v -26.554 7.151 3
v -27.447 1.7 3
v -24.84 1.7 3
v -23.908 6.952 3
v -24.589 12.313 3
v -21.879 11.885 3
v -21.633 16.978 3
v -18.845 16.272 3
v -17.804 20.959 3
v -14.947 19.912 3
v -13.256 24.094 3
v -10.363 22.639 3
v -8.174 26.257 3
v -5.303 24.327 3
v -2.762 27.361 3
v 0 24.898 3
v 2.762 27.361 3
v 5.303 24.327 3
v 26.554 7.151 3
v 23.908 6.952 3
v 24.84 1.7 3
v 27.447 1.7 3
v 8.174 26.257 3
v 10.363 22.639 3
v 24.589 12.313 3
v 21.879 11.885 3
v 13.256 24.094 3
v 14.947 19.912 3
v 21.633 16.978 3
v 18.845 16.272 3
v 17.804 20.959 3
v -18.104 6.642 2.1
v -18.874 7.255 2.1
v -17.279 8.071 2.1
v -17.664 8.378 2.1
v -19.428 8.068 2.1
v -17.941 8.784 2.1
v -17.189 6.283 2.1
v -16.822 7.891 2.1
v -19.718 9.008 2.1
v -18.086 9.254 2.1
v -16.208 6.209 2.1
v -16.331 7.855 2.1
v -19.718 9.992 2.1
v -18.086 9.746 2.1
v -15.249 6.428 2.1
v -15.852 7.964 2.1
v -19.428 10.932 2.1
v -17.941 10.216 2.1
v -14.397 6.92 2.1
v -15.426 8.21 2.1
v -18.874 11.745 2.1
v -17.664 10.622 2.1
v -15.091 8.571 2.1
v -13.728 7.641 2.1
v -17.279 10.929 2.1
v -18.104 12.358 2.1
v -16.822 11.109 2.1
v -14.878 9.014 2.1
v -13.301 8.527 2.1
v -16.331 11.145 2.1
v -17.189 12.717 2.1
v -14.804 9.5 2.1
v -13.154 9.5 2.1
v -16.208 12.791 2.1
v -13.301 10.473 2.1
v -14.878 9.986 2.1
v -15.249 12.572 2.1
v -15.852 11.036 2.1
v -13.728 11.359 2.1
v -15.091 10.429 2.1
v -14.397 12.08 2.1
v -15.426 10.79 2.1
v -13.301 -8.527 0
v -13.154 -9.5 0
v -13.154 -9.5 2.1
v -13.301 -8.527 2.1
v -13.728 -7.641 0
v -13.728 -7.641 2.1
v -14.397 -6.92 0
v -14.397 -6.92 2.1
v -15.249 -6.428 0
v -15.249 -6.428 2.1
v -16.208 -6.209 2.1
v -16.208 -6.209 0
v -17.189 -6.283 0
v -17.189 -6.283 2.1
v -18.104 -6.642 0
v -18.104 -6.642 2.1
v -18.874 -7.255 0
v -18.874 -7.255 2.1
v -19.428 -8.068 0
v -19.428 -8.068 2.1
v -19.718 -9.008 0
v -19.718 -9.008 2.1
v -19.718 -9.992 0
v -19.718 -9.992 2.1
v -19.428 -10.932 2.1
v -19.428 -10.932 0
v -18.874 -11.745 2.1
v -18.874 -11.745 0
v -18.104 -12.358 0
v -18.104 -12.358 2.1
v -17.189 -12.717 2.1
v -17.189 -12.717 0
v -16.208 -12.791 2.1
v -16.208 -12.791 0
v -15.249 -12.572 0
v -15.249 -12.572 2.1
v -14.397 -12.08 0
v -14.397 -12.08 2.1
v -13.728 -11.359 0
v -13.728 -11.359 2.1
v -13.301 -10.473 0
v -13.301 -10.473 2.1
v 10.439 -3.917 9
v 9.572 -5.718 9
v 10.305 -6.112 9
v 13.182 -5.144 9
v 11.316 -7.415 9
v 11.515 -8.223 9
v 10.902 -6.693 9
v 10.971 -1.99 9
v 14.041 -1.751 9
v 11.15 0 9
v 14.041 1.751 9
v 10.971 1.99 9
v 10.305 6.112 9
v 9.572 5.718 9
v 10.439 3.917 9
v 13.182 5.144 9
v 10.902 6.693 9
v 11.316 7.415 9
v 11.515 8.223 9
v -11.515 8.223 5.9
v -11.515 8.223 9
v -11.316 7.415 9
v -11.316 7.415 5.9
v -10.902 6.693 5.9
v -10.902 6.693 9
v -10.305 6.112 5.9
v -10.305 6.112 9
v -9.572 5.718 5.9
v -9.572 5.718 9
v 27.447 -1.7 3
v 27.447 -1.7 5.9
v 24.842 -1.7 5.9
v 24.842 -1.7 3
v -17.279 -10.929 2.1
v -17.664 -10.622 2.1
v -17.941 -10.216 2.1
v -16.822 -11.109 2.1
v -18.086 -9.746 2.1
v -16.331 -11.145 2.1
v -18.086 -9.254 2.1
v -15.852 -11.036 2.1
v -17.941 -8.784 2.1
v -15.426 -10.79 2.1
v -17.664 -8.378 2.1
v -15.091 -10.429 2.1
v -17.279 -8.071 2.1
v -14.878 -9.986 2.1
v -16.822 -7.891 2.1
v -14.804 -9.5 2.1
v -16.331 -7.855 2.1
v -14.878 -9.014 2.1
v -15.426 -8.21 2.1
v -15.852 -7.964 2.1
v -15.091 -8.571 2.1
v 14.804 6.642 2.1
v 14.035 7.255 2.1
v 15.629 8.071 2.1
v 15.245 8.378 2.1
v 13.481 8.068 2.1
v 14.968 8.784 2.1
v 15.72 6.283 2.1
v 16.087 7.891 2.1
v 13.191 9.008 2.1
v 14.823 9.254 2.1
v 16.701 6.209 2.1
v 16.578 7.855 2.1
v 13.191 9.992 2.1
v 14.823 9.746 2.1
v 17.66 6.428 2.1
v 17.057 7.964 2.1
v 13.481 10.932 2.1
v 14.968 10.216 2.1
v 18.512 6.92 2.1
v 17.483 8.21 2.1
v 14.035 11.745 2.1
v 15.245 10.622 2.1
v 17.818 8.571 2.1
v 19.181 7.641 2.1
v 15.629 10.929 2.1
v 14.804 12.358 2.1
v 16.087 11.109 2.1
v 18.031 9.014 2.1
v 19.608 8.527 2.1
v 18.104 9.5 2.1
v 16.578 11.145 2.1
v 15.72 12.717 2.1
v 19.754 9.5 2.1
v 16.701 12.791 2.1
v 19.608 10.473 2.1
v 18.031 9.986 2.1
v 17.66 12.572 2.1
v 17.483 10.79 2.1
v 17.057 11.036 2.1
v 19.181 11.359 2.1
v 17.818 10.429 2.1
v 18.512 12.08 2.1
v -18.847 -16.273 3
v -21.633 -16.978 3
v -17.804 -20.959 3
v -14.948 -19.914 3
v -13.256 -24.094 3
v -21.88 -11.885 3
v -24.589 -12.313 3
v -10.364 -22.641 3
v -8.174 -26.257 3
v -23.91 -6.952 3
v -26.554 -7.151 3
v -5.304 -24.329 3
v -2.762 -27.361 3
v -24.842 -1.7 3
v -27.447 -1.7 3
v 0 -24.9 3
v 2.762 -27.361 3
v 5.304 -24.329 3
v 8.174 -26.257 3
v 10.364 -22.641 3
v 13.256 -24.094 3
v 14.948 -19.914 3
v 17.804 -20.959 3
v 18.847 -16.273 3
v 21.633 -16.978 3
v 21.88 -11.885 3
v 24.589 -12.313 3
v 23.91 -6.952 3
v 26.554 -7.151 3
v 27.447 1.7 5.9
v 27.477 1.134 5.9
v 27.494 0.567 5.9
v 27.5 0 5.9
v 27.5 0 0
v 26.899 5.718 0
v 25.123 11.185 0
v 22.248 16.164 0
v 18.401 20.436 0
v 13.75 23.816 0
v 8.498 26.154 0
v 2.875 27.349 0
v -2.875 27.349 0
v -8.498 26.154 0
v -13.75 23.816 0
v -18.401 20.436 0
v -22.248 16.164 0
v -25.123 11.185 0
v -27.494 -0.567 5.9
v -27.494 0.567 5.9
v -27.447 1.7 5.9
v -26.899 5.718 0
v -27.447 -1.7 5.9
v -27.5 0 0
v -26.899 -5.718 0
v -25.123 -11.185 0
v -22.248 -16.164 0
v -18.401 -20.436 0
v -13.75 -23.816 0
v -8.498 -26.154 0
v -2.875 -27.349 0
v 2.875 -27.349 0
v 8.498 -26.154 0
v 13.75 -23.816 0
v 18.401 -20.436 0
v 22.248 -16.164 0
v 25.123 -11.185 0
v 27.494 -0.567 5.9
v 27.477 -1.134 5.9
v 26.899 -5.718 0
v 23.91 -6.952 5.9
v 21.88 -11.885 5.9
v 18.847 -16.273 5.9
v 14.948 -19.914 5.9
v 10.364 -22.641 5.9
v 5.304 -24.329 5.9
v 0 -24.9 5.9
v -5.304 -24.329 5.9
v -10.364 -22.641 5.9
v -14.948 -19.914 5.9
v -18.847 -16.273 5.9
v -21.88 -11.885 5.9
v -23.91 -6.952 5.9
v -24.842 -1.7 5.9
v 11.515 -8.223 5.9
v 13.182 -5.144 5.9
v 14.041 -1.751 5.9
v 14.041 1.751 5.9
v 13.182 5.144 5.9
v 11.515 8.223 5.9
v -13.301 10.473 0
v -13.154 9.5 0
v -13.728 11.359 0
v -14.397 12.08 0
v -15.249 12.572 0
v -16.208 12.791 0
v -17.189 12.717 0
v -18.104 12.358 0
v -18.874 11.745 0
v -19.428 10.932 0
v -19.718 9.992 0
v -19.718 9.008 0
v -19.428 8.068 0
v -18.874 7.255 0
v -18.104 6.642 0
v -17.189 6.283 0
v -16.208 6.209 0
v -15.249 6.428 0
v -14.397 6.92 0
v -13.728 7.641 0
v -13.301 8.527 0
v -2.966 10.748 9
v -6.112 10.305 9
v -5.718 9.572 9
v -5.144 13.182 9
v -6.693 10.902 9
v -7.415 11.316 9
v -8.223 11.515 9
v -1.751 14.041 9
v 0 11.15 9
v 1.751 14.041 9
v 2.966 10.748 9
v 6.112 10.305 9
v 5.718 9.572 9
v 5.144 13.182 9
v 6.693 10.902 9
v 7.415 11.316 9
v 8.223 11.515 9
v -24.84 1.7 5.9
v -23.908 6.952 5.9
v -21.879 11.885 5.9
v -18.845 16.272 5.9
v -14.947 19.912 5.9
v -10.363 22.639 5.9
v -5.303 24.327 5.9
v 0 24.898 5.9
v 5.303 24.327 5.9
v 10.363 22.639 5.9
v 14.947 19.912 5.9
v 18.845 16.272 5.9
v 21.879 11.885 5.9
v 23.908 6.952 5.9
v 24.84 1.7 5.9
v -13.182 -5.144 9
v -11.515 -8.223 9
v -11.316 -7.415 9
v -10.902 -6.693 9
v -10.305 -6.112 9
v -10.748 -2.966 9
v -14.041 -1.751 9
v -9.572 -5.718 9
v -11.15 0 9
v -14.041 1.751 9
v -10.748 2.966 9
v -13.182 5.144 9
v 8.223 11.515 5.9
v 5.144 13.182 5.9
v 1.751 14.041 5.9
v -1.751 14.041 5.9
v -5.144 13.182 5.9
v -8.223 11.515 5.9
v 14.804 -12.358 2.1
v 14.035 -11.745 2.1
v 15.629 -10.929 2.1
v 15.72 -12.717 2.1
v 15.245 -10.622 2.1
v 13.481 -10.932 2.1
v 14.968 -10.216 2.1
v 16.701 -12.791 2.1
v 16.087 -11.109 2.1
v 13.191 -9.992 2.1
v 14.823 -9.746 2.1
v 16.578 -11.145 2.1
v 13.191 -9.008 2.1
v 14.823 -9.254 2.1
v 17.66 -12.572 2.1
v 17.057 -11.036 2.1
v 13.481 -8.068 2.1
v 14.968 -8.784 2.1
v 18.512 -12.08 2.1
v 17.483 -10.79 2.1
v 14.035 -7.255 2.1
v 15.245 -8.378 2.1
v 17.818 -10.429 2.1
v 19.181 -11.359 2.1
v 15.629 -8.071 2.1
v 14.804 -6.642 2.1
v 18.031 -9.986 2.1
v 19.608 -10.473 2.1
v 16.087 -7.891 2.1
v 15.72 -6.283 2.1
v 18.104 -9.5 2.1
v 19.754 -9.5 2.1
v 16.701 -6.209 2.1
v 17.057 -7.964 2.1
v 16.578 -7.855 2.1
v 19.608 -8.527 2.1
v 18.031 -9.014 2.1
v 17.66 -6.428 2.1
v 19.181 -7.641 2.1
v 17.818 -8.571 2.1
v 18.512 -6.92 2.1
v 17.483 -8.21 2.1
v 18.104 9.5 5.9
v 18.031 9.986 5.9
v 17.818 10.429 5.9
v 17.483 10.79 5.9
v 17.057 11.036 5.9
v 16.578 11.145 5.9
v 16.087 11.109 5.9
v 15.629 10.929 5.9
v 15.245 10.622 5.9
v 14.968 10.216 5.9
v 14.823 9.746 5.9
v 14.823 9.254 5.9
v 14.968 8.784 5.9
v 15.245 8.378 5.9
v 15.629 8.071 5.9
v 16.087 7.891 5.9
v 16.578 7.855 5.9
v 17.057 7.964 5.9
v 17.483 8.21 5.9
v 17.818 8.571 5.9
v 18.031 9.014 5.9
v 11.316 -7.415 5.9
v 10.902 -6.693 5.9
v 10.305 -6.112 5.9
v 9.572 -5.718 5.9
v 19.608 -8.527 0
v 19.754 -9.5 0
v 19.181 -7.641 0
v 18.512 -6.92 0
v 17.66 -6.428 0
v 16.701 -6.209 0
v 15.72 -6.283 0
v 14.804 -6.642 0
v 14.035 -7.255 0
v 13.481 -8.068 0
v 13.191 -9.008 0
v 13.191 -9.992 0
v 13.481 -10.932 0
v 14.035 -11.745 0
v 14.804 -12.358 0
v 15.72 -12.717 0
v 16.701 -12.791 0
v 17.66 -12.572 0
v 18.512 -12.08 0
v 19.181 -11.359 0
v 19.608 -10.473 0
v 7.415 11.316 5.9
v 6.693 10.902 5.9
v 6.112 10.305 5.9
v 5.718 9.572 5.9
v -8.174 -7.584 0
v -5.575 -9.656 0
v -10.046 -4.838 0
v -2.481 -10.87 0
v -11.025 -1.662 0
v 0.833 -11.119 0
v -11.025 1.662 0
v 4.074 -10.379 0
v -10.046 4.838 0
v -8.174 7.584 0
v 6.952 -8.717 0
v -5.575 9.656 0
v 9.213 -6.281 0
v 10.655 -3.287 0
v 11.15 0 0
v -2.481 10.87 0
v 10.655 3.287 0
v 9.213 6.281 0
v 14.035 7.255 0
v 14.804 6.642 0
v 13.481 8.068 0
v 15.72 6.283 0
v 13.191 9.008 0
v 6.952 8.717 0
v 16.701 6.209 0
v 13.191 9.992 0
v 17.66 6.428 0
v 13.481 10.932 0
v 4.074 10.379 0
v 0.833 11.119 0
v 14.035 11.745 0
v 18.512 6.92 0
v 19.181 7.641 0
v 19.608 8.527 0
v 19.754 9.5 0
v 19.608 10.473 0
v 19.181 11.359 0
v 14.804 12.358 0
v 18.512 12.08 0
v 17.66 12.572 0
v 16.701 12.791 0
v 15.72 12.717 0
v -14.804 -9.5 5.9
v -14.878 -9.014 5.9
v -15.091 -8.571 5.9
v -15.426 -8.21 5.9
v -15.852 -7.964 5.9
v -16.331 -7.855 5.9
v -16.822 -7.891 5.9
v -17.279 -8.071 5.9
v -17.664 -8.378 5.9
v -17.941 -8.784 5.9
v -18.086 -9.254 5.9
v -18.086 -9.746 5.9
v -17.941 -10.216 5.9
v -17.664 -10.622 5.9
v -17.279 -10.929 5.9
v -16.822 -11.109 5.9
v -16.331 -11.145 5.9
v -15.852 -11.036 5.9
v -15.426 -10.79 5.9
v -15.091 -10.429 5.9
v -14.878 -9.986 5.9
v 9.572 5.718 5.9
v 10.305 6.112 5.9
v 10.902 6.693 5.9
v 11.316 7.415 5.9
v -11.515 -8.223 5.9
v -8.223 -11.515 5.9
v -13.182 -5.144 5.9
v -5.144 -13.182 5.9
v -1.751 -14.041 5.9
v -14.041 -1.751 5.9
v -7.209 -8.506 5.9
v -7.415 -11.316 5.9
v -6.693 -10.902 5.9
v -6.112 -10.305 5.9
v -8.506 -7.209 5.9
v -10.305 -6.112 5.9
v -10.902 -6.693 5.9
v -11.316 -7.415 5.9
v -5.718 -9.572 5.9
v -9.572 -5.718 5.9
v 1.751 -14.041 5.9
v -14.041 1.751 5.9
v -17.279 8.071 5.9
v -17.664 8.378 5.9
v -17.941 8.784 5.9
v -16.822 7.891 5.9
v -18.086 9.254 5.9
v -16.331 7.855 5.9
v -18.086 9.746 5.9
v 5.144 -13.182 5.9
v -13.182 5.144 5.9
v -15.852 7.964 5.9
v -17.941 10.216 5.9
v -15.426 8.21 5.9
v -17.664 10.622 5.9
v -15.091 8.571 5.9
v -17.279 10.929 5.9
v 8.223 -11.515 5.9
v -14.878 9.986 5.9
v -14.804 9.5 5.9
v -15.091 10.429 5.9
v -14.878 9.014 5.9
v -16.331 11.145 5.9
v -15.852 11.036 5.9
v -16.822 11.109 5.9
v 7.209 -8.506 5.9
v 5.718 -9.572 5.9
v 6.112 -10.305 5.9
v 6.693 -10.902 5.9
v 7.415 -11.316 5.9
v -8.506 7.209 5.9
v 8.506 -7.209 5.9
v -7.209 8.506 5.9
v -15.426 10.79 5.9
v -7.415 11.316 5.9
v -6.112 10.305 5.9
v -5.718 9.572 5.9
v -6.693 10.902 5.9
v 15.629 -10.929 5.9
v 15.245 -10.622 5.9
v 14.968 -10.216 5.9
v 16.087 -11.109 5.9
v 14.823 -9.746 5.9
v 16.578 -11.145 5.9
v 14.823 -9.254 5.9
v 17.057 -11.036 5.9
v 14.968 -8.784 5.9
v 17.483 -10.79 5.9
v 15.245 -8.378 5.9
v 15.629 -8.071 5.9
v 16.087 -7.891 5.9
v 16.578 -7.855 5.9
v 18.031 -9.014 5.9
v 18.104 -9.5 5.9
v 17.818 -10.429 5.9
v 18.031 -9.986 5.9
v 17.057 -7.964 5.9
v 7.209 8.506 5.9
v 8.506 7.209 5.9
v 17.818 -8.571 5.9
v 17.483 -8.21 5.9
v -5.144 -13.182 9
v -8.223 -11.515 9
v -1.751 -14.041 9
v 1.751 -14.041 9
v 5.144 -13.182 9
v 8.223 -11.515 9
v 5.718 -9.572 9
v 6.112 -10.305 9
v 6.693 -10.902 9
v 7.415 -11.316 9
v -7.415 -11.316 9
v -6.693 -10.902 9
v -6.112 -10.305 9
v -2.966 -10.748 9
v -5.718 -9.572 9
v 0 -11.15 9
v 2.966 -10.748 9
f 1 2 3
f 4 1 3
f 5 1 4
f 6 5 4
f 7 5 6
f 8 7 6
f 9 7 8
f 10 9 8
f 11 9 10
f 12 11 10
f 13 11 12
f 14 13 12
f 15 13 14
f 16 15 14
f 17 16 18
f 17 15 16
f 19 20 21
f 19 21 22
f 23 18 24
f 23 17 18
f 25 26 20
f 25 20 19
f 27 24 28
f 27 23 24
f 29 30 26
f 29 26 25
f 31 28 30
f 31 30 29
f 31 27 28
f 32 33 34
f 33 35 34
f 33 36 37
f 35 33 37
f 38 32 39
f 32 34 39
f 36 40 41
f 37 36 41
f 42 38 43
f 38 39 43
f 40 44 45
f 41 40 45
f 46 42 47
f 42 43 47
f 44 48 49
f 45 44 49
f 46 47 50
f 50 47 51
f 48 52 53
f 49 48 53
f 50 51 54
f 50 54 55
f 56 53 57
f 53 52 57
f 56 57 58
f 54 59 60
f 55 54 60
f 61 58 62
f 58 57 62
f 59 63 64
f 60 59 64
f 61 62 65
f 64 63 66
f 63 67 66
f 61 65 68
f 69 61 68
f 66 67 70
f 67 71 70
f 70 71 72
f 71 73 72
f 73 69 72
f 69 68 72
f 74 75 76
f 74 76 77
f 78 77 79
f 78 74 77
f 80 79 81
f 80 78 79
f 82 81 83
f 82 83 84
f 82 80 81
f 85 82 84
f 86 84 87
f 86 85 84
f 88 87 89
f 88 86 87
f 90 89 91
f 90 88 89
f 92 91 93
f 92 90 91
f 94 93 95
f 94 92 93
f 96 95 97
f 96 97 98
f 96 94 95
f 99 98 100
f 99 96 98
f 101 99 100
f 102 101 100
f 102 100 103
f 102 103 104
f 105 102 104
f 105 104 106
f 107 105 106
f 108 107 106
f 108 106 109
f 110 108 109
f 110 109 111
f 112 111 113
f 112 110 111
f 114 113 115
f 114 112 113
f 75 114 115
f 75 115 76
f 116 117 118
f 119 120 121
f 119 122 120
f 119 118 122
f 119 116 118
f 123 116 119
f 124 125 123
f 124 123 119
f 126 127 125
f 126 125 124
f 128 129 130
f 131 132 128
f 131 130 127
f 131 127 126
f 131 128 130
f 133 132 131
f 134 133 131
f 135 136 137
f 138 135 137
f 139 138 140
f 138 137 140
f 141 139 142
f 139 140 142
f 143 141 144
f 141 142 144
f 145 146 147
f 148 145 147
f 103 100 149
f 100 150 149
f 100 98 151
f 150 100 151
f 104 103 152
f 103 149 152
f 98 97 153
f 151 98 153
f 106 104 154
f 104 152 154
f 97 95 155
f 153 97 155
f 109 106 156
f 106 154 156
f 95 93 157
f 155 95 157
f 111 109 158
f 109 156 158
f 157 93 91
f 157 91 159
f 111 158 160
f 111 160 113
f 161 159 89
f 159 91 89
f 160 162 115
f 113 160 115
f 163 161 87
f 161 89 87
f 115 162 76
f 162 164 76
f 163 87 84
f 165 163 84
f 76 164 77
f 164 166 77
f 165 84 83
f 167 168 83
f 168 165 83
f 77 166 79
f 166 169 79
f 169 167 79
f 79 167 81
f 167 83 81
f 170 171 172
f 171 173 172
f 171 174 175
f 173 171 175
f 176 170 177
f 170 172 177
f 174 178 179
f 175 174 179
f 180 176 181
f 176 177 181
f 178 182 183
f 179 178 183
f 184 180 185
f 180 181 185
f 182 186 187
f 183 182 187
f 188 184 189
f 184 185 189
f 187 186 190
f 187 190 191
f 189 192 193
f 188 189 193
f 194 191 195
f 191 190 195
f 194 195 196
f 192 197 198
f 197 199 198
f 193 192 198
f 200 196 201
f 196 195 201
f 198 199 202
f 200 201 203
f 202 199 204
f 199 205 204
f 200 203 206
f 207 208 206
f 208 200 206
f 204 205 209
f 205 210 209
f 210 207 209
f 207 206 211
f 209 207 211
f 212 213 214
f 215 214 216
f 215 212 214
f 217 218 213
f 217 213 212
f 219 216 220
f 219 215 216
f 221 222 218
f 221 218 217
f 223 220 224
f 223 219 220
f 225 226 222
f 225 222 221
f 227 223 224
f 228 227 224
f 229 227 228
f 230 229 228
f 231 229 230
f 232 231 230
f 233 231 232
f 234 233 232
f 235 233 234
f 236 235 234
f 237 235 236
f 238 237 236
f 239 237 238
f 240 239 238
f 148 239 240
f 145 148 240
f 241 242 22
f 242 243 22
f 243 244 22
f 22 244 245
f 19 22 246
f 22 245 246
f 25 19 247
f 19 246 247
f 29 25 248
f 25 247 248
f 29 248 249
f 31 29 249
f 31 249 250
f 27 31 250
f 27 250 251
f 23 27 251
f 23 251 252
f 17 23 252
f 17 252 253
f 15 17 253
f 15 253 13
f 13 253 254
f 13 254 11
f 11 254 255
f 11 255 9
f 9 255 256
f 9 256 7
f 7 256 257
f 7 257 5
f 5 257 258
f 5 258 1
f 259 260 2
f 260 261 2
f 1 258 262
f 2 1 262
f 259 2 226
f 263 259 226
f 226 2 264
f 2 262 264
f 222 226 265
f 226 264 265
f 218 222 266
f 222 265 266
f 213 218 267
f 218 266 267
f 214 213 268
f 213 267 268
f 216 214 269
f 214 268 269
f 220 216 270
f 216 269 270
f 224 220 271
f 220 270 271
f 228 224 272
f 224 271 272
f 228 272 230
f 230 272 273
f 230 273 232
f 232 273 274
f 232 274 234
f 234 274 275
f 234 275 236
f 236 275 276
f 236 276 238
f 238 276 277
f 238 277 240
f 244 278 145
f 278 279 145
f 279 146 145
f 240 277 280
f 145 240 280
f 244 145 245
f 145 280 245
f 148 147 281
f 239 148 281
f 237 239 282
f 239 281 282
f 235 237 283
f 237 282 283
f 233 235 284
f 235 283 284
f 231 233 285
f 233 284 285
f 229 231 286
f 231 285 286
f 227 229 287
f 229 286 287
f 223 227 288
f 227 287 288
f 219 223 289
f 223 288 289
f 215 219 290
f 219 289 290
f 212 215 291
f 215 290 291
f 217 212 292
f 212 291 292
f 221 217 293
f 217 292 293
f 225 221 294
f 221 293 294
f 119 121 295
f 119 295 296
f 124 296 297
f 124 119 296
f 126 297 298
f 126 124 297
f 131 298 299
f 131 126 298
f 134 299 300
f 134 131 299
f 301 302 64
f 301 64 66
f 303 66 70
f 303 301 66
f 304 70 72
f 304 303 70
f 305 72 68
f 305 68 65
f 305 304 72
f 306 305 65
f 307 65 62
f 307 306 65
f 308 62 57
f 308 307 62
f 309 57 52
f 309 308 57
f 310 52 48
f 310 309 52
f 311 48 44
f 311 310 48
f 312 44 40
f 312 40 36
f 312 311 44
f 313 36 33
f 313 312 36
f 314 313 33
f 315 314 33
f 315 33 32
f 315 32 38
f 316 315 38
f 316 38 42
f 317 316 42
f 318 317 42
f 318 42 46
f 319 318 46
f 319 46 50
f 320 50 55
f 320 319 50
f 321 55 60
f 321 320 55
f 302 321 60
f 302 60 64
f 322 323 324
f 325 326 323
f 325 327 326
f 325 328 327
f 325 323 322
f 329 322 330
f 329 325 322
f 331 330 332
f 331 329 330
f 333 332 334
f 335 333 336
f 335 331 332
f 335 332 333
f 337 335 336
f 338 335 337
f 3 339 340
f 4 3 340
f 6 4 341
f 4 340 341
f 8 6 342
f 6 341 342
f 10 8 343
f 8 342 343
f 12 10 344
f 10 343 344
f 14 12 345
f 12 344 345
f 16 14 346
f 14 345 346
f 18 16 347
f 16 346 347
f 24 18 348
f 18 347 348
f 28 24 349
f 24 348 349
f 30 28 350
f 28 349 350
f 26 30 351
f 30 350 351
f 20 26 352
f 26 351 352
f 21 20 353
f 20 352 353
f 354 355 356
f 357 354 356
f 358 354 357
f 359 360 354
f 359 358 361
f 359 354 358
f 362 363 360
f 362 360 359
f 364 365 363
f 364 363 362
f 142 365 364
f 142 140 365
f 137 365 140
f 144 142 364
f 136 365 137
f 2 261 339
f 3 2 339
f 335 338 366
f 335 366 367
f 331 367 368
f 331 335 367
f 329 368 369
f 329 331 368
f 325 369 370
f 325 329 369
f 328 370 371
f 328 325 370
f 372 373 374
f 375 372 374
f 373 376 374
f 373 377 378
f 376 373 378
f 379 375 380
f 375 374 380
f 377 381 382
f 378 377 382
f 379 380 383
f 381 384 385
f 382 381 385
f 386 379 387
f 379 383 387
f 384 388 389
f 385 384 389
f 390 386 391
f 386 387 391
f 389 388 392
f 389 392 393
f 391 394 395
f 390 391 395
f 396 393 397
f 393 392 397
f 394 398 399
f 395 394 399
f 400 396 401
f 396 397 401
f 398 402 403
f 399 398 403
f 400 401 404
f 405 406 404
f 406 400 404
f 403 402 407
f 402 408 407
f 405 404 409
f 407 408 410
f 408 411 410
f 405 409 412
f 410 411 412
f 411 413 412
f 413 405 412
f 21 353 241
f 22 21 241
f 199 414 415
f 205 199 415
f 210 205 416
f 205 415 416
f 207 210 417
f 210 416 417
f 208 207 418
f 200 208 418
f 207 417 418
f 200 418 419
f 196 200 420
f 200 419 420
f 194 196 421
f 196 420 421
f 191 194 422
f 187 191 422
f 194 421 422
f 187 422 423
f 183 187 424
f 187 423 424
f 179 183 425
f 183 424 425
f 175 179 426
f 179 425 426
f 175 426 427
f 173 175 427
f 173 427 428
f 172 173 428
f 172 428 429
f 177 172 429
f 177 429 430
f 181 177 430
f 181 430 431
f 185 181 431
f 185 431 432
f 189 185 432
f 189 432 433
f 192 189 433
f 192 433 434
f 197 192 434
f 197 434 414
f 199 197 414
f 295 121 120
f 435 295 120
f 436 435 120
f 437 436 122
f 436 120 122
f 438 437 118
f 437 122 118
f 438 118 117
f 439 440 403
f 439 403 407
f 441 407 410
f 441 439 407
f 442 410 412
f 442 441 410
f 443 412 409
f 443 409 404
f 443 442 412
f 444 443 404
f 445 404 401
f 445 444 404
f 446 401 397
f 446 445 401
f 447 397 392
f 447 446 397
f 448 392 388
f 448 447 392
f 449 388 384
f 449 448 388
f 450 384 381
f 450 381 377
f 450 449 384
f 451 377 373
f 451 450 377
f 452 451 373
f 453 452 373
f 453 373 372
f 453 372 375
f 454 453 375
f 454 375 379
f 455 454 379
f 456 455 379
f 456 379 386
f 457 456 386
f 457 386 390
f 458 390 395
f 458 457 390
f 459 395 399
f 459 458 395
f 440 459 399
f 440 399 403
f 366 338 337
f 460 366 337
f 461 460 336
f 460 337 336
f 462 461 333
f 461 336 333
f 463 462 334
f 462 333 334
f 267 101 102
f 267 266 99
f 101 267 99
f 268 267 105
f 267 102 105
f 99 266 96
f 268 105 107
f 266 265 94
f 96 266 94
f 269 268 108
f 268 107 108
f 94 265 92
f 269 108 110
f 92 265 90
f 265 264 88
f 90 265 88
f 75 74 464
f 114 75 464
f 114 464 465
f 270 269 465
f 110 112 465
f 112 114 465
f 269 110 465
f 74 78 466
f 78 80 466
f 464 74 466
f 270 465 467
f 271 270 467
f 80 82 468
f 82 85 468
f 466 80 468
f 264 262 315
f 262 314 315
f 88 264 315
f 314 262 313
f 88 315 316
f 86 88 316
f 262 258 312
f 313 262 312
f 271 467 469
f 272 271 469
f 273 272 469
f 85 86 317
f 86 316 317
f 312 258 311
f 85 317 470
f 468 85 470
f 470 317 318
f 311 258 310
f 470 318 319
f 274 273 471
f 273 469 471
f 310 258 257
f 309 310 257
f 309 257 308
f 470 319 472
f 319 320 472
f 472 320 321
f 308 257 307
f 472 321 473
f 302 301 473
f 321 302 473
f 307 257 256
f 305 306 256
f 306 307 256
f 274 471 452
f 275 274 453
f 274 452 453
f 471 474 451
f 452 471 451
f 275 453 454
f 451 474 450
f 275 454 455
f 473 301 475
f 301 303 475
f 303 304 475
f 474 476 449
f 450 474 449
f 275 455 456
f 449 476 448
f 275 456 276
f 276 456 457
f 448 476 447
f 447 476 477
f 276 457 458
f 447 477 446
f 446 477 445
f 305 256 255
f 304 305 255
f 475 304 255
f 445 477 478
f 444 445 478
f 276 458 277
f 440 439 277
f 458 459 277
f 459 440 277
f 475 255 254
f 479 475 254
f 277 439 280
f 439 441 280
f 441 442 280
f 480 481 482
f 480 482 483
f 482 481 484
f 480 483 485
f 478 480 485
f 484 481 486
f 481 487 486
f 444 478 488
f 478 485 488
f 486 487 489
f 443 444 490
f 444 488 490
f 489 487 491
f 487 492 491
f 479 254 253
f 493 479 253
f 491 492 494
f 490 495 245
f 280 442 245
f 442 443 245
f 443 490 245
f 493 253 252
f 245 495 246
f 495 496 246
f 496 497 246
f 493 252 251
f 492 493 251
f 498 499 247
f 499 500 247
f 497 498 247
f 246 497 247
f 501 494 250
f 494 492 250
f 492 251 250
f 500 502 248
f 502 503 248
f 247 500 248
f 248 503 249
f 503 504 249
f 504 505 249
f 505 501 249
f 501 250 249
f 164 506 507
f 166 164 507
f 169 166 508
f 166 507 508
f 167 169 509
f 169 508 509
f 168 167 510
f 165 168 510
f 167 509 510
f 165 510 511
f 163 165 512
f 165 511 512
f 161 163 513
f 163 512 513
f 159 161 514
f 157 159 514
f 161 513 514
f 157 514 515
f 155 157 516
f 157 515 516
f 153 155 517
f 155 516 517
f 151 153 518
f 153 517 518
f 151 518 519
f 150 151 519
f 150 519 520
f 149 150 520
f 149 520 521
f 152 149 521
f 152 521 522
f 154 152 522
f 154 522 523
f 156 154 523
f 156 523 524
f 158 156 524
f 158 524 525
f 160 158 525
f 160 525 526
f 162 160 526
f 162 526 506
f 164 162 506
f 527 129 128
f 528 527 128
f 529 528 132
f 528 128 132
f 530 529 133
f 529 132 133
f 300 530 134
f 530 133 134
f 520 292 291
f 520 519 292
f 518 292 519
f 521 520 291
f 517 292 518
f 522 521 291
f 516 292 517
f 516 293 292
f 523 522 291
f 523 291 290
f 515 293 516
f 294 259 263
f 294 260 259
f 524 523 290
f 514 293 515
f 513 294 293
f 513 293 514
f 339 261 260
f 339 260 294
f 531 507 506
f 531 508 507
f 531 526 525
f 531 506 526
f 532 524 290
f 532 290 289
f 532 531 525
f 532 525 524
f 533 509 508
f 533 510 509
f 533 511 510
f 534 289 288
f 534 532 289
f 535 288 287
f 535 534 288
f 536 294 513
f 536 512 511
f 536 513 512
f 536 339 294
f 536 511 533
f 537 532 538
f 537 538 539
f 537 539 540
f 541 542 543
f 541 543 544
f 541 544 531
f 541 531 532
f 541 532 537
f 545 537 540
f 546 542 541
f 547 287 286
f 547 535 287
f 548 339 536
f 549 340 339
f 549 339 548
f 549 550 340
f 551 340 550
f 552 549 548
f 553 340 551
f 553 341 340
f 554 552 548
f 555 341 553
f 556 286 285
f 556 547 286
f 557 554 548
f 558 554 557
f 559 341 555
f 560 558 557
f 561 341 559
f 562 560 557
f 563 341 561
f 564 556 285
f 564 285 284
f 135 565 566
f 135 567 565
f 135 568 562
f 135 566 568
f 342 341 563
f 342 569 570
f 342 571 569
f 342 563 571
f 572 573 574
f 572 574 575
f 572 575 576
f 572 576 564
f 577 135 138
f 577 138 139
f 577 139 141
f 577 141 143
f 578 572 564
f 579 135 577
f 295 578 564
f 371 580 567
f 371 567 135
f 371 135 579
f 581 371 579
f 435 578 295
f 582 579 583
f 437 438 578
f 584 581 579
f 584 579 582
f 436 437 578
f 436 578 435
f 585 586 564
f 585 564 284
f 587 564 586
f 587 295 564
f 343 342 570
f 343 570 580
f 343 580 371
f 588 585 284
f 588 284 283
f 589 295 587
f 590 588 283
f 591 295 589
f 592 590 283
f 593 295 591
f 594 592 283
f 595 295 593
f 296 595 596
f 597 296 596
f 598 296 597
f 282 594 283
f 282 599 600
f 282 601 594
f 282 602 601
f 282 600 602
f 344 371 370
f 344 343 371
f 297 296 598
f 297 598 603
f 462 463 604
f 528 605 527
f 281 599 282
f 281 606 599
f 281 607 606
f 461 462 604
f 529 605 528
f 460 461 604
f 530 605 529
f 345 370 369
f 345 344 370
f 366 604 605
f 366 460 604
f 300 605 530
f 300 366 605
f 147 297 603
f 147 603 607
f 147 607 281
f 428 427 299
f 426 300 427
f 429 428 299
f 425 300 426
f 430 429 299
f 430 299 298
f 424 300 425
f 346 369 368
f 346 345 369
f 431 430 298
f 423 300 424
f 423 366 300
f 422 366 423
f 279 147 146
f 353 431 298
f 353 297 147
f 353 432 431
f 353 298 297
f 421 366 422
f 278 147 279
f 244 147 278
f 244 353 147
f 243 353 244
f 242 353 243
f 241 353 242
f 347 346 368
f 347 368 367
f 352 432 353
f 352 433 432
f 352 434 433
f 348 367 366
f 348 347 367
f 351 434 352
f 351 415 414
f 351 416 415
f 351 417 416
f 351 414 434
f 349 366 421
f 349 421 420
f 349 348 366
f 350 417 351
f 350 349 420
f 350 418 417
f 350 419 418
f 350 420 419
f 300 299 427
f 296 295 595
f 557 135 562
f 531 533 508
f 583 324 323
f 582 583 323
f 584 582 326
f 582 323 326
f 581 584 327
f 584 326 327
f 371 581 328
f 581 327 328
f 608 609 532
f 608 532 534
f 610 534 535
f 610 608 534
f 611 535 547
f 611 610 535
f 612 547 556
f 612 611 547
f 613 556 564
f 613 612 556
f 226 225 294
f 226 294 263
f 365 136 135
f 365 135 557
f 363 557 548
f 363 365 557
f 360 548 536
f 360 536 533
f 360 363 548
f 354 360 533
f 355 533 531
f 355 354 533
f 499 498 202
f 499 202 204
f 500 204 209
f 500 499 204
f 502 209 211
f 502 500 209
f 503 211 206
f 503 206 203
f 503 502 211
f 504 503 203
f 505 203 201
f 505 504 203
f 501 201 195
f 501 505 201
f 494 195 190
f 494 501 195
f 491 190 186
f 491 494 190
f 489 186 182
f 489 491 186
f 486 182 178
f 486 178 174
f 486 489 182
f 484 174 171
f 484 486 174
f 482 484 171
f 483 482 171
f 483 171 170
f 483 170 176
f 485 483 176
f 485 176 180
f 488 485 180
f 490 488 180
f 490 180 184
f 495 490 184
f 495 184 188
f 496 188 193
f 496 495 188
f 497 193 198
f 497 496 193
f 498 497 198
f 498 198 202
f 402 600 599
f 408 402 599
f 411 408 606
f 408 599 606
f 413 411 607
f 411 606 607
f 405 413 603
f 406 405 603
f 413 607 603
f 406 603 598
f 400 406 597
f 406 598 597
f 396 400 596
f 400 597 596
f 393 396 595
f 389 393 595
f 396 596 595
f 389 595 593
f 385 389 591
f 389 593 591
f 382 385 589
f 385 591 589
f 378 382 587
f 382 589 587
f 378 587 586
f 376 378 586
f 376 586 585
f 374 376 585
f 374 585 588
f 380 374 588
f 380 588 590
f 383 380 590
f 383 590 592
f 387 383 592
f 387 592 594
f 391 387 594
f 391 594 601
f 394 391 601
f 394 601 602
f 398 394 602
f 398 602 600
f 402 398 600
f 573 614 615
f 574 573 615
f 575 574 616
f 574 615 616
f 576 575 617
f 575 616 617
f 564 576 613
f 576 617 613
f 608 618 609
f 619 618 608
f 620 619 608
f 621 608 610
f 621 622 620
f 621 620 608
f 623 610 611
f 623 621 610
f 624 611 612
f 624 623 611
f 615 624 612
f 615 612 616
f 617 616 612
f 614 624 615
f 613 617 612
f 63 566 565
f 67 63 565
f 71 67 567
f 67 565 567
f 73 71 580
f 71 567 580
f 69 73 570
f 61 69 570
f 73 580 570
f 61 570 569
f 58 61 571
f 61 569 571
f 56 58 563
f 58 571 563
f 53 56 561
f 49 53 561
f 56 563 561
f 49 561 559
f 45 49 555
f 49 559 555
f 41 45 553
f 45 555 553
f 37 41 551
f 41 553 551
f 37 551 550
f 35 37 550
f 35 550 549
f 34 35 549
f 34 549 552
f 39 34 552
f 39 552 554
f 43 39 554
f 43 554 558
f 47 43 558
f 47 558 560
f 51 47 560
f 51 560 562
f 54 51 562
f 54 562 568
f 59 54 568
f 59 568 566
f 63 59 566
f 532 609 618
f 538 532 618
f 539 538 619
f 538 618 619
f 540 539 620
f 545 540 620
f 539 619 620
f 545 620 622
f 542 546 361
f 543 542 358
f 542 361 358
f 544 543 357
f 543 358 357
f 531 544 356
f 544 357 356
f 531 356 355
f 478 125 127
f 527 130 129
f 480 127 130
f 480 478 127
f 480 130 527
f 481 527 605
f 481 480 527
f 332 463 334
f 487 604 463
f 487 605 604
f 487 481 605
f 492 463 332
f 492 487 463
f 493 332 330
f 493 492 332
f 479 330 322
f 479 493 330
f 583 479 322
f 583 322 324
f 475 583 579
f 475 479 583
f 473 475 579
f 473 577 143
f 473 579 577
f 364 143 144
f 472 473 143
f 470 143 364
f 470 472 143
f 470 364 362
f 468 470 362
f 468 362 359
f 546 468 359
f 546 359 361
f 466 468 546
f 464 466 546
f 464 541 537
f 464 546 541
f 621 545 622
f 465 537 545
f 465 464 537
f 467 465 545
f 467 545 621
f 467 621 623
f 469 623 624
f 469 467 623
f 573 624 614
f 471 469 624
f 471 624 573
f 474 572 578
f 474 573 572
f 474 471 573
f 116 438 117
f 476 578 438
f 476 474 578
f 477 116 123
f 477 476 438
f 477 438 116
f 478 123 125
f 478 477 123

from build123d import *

# Parameters (mm, degrees)
SKETCH1_R           = 27.5
SKETCH1_R_2         = 11.15
BOSS_EXTRUDE1_DEPTH = 9
CUT_EXTRUDE1_START  = 9
CUT_EXTRUDE1_DEPTH  = 6
CUT_EXTRUDE2_START  = 9
SKETCH3_R           = 39.185897799
SKETCH3_R_2         = 14.15
CUT_EXTRUDE2_DEPTH  = 3.1
CUT_EXTRUDE3_START  = 5.9
SKETCH4_R           = 1.65
CUT_EXTRUDE3_DEPTH  = 6.9
CUT_EXTRUDE9_START  = 9
SKETCH9_R           = 3
CUT_EXTRUDE9_DEPTH  = 3.1
SKETCH8_R           = 3.3
CUT_EXTRUDE10_DEPTH = 2.1


with BuildPart() as part:
    # Sketch1 → Boss-Extrude1 (new body)
    with BuildSketch(Plane.XY):
        Circle(SKETCH1_R)
        Circle(SKETCH1_R_2, mode=Mode.SUBTRACT)
    extrude(amount=BOSS_EXTRUDE1_DEPTH)

    # Sketch2 → Cut-Extrude1 (cut)
    with BuildSketch(Plane.XY.offset(CUT_EXTRUDE1_START)):
        with BuildLine():
            Line((-27.447404249, 1.7), (-24.84017663, 1.7))
            ThreePointArc((-24.84017663, 1.7), (0, 24.898280563), (24.84017663, 1.7))
            Line((24.84017663, 1.7), (27.447404249, 1.7))
            ThreePointArc((27.447404249, 1.7), (0, 27.5), (-27.447404249, 1.7))
        make_face()
        with BuildLine():
            Line((27.447404249, -1.7), (24.841900088, -1.7))
            ThreePointArc((24.841900088, -1.7), (0, -24.9), (-24.841900088, -1.7))
            Line((-24.841900088, -1.7), (-27.447404249, -1.7))
            ThreePointArc((-27.447404249, -1.7), (0, -27.5), (27.447404249, -1.7))
        make_face()
    extrude(amount=-CUT_EXTRUDE1_DEPTH, mode=Mode.SUBTRACT)

    # Sketch3 → Cut-Extrude2 (cut)
    with BuildSketch(Plane.XY.offset(CUT_EXTRUDE2_START)):
        Circle(SKETCH3_R)
        Circle(SKETCH3_R_2, mode=Mode.SUBTRACT)
    extrude(amount=-CUT_EXTRUDE2_DEPTH, mode=Mode.SUBTRACT)

    # Sketch4 → Cut-Extrude3 (cut, through all)
    with BuildSketch(Plane.XY.offset(CUT_EXTRUDE3_START)):
        with Locations((-16.454482672, 9.5)):
            Circle(SKETCH4_R)
        with Locations((16.454482672, 9.5)):
            Circle(SKETCH4_R)
        with Locations((16.454482672, -9.5)):
            Circle(SKETCH4_R)
        with Locations((-16.454482672, -9.5)):
            Circle(SKETCH4_R)
    extrude(amount=-CUT_EXTRUDE3_DEPTH, mode=Mode.SUBTRACT)

    # Sketch9 → Cut-Extrude9 (cut)
    with BuildSketch(Plane.XY.offset(CUT_EXTRUDE9_START)):
        with Locations((-8.530989978, 8.530989978)):
            Circle(SKETCH9_R)
        with Locations((8.530989978, 8.530989978)):
            Circle(SKETCH9_R)
        with Locations((8.530989978, -8.530989978)):
            Circle(SKETCH9_R)
        with Locations((-8.530989978, -8.530989978)):
            Circle(SKETCH9_R)
    extrude(amount=-CUT_EXTRUDE9_DEPTH, mode=Mode.SUBTRACT)

    # Sketch8 → Cut-Extrude10 (cut)
    with BuildSketch(Plane.XY):
        with Locations((-16.454482672, 9.5)):
            Circle(SKETCH8_R)
        with Locations((-16.454482672, -9.5)):
            Circle(SKETCH8_R)
        with Locations((16.454482672, -9.5)):
            Circle(SKETCH8_R)
        with Locations((16.454482672, 9.5)):
            Circle(SKETCH8_R)
    extrude(amount=CUT_EXTRUDE10_DEPTH, mode=Mode.SUBTRACT)


solid = part.part
